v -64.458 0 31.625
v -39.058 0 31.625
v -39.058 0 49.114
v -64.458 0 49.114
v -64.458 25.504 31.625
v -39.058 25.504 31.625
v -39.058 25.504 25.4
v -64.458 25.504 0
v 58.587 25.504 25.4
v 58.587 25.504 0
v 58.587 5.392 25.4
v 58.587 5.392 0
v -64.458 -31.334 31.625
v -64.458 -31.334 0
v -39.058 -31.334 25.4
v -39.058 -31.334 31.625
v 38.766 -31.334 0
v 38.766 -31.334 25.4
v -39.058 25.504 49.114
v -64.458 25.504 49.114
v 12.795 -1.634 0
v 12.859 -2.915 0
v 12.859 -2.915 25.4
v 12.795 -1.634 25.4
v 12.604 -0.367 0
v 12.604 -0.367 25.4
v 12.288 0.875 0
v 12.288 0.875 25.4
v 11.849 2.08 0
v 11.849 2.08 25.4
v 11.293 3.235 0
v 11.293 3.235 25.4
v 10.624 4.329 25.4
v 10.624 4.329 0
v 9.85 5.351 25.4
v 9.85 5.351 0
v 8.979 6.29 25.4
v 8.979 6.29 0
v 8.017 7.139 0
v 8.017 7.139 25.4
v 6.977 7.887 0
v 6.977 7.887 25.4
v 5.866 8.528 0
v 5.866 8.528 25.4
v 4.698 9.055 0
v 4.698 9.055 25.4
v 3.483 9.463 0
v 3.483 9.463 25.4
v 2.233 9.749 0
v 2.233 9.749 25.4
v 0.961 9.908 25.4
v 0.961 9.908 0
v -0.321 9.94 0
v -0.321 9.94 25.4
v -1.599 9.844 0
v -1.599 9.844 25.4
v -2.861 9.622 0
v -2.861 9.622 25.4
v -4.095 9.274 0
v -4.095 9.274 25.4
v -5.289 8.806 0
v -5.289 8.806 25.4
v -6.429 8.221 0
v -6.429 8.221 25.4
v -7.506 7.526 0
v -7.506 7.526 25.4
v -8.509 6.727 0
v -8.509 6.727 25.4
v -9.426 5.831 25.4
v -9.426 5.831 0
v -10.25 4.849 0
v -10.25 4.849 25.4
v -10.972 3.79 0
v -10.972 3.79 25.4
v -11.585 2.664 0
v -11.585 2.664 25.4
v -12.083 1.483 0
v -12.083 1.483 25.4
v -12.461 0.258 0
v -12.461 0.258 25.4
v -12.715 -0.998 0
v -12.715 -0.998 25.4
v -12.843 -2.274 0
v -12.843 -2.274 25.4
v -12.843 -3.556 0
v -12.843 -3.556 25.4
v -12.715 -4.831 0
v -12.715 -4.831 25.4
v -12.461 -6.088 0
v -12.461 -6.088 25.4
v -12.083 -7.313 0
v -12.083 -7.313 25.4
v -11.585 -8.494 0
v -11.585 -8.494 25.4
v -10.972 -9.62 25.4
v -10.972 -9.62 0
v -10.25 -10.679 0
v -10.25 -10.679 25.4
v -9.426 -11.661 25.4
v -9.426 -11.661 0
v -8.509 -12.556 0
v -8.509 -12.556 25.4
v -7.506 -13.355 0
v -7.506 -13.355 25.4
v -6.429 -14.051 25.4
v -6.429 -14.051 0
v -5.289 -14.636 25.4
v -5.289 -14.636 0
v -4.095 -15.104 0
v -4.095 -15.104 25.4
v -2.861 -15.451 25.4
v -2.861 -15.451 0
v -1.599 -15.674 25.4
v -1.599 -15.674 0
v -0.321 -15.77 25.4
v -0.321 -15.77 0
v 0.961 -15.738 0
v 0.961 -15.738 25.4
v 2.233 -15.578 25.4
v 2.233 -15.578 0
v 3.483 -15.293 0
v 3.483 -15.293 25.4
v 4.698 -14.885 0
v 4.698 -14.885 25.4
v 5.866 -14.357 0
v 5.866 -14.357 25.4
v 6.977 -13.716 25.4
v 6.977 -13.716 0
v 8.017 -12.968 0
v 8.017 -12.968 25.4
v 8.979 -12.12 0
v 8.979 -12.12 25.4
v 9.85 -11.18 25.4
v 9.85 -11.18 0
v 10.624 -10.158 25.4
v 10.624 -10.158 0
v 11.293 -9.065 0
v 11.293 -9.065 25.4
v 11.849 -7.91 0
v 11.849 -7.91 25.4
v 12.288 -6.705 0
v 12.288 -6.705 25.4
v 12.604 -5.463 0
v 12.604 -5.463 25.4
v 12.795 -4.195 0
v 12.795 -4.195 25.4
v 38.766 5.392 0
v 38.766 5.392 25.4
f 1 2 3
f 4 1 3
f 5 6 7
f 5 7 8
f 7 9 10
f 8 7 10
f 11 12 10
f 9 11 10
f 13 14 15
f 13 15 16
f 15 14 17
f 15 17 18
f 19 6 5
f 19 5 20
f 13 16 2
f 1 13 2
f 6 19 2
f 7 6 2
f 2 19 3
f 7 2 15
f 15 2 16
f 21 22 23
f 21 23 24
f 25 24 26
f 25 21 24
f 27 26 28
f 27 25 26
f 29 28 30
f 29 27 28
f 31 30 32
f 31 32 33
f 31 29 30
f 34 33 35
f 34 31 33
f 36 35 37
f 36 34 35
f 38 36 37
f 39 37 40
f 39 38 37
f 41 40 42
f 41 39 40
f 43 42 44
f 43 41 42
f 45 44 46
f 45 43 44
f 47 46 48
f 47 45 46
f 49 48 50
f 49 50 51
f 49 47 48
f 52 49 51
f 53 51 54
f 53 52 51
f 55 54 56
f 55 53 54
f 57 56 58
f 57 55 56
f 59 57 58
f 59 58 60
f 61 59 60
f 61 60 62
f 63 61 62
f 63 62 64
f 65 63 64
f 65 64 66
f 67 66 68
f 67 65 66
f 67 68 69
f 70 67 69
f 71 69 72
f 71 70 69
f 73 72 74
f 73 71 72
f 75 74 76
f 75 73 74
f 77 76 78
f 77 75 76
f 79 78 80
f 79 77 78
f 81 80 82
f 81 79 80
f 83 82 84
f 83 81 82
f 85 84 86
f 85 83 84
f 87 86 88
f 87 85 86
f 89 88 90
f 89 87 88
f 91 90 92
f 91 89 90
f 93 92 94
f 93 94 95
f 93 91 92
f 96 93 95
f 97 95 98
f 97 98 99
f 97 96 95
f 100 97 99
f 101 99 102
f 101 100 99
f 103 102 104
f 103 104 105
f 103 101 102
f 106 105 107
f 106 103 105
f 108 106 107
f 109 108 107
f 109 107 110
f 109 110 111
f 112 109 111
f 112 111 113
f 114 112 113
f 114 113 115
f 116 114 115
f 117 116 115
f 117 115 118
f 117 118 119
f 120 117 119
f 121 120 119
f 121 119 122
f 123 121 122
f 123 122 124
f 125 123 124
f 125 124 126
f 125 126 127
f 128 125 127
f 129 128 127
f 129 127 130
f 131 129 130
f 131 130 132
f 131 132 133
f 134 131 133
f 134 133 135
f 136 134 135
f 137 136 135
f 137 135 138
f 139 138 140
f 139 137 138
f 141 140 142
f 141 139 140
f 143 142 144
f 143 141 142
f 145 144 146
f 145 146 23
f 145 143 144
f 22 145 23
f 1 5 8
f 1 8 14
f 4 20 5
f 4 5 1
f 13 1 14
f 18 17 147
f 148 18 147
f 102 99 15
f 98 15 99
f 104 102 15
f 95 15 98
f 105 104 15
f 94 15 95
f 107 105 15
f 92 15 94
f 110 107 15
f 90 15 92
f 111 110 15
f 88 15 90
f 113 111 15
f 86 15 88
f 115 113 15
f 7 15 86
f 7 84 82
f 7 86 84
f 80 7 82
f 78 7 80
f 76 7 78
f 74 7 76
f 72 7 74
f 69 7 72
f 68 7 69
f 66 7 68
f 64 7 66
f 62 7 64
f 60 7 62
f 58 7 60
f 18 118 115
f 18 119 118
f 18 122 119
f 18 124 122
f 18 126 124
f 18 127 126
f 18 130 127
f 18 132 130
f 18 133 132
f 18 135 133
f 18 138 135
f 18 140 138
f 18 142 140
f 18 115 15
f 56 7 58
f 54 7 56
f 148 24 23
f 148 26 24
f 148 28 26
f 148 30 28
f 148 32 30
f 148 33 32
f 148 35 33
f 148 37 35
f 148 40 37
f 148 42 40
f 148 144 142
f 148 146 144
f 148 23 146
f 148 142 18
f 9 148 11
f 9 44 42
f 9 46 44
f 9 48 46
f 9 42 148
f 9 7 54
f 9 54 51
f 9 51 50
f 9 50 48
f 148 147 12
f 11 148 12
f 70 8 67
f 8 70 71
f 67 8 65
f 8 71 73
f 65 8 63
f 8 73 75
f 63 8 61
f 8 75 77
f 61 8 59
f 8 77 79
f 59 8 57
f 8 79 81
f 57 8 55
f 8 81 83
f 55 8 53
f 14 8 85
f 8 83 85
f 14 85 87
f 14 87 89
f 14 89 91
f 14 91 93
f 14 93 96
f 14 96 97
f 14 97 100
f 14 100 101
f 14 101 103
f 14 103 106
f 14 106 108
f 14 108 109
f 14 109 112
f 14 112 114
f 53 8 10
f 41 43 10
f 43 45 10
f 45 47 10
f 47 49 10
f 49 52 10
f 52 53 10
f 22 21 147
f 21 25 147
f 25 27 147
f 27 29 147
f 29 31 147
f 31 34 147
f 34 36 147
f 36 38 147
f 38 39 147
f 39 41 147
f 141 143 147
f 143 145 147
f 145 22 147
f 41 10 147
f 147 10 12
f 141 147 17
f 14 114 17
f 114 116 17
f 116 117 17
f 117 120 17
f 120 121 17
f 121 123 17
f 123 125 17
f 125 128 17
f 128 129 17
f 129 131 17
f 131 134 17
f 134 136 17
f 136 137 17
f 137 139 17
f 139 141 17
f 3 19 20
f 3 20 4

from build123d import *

# Parameters (mm, degrees)
F0_R     = 12.858823
F0_W     = 19.820329
F0_H     = 20.111802
F1_DEPTH = 25.4
F2_W     = 25.504097
F2_H     = 17.488524
F3_DEPTH = 25.4


with BuildPart() as f1:
    # F0 (on Top) → F1 (new body)
    with BuildSketch(Plane.XY):
        Polygon((38.766231, 25.504097), (-39.057706, 25.504097), (-39.057706, -31.333605), (38.766231, -31.333605), (38.766231, 5.392295), align=None)
        with Locations((0, -2.914754)):
            Circle(F0_R, mode=Mode.SUBTRACT)
        with Locations((48.676395, 15.448196)):
            Rectangle(F0_W, F0_H)
    extrude(amount=F1_DEPTH)

    # F2 (on face) → F3 (join)
    with BuildSketch(Plane(origin=(-39.057706, 0, 0), x_dir=(0, -1, 0), z_dir=(-1, 0, 0))):
        with Locations((-12.752048, 40.369343)):
            Rectangle(F2_W, F2_H)
        Polygon((0, 31.625081), (-25.504097, 31.625081), (-25.504097, 0), (31.333605, 0), (31.333605, 31.625081), align=None)
    extrude(amount=F3_DEPTH)


solid = f1.part
